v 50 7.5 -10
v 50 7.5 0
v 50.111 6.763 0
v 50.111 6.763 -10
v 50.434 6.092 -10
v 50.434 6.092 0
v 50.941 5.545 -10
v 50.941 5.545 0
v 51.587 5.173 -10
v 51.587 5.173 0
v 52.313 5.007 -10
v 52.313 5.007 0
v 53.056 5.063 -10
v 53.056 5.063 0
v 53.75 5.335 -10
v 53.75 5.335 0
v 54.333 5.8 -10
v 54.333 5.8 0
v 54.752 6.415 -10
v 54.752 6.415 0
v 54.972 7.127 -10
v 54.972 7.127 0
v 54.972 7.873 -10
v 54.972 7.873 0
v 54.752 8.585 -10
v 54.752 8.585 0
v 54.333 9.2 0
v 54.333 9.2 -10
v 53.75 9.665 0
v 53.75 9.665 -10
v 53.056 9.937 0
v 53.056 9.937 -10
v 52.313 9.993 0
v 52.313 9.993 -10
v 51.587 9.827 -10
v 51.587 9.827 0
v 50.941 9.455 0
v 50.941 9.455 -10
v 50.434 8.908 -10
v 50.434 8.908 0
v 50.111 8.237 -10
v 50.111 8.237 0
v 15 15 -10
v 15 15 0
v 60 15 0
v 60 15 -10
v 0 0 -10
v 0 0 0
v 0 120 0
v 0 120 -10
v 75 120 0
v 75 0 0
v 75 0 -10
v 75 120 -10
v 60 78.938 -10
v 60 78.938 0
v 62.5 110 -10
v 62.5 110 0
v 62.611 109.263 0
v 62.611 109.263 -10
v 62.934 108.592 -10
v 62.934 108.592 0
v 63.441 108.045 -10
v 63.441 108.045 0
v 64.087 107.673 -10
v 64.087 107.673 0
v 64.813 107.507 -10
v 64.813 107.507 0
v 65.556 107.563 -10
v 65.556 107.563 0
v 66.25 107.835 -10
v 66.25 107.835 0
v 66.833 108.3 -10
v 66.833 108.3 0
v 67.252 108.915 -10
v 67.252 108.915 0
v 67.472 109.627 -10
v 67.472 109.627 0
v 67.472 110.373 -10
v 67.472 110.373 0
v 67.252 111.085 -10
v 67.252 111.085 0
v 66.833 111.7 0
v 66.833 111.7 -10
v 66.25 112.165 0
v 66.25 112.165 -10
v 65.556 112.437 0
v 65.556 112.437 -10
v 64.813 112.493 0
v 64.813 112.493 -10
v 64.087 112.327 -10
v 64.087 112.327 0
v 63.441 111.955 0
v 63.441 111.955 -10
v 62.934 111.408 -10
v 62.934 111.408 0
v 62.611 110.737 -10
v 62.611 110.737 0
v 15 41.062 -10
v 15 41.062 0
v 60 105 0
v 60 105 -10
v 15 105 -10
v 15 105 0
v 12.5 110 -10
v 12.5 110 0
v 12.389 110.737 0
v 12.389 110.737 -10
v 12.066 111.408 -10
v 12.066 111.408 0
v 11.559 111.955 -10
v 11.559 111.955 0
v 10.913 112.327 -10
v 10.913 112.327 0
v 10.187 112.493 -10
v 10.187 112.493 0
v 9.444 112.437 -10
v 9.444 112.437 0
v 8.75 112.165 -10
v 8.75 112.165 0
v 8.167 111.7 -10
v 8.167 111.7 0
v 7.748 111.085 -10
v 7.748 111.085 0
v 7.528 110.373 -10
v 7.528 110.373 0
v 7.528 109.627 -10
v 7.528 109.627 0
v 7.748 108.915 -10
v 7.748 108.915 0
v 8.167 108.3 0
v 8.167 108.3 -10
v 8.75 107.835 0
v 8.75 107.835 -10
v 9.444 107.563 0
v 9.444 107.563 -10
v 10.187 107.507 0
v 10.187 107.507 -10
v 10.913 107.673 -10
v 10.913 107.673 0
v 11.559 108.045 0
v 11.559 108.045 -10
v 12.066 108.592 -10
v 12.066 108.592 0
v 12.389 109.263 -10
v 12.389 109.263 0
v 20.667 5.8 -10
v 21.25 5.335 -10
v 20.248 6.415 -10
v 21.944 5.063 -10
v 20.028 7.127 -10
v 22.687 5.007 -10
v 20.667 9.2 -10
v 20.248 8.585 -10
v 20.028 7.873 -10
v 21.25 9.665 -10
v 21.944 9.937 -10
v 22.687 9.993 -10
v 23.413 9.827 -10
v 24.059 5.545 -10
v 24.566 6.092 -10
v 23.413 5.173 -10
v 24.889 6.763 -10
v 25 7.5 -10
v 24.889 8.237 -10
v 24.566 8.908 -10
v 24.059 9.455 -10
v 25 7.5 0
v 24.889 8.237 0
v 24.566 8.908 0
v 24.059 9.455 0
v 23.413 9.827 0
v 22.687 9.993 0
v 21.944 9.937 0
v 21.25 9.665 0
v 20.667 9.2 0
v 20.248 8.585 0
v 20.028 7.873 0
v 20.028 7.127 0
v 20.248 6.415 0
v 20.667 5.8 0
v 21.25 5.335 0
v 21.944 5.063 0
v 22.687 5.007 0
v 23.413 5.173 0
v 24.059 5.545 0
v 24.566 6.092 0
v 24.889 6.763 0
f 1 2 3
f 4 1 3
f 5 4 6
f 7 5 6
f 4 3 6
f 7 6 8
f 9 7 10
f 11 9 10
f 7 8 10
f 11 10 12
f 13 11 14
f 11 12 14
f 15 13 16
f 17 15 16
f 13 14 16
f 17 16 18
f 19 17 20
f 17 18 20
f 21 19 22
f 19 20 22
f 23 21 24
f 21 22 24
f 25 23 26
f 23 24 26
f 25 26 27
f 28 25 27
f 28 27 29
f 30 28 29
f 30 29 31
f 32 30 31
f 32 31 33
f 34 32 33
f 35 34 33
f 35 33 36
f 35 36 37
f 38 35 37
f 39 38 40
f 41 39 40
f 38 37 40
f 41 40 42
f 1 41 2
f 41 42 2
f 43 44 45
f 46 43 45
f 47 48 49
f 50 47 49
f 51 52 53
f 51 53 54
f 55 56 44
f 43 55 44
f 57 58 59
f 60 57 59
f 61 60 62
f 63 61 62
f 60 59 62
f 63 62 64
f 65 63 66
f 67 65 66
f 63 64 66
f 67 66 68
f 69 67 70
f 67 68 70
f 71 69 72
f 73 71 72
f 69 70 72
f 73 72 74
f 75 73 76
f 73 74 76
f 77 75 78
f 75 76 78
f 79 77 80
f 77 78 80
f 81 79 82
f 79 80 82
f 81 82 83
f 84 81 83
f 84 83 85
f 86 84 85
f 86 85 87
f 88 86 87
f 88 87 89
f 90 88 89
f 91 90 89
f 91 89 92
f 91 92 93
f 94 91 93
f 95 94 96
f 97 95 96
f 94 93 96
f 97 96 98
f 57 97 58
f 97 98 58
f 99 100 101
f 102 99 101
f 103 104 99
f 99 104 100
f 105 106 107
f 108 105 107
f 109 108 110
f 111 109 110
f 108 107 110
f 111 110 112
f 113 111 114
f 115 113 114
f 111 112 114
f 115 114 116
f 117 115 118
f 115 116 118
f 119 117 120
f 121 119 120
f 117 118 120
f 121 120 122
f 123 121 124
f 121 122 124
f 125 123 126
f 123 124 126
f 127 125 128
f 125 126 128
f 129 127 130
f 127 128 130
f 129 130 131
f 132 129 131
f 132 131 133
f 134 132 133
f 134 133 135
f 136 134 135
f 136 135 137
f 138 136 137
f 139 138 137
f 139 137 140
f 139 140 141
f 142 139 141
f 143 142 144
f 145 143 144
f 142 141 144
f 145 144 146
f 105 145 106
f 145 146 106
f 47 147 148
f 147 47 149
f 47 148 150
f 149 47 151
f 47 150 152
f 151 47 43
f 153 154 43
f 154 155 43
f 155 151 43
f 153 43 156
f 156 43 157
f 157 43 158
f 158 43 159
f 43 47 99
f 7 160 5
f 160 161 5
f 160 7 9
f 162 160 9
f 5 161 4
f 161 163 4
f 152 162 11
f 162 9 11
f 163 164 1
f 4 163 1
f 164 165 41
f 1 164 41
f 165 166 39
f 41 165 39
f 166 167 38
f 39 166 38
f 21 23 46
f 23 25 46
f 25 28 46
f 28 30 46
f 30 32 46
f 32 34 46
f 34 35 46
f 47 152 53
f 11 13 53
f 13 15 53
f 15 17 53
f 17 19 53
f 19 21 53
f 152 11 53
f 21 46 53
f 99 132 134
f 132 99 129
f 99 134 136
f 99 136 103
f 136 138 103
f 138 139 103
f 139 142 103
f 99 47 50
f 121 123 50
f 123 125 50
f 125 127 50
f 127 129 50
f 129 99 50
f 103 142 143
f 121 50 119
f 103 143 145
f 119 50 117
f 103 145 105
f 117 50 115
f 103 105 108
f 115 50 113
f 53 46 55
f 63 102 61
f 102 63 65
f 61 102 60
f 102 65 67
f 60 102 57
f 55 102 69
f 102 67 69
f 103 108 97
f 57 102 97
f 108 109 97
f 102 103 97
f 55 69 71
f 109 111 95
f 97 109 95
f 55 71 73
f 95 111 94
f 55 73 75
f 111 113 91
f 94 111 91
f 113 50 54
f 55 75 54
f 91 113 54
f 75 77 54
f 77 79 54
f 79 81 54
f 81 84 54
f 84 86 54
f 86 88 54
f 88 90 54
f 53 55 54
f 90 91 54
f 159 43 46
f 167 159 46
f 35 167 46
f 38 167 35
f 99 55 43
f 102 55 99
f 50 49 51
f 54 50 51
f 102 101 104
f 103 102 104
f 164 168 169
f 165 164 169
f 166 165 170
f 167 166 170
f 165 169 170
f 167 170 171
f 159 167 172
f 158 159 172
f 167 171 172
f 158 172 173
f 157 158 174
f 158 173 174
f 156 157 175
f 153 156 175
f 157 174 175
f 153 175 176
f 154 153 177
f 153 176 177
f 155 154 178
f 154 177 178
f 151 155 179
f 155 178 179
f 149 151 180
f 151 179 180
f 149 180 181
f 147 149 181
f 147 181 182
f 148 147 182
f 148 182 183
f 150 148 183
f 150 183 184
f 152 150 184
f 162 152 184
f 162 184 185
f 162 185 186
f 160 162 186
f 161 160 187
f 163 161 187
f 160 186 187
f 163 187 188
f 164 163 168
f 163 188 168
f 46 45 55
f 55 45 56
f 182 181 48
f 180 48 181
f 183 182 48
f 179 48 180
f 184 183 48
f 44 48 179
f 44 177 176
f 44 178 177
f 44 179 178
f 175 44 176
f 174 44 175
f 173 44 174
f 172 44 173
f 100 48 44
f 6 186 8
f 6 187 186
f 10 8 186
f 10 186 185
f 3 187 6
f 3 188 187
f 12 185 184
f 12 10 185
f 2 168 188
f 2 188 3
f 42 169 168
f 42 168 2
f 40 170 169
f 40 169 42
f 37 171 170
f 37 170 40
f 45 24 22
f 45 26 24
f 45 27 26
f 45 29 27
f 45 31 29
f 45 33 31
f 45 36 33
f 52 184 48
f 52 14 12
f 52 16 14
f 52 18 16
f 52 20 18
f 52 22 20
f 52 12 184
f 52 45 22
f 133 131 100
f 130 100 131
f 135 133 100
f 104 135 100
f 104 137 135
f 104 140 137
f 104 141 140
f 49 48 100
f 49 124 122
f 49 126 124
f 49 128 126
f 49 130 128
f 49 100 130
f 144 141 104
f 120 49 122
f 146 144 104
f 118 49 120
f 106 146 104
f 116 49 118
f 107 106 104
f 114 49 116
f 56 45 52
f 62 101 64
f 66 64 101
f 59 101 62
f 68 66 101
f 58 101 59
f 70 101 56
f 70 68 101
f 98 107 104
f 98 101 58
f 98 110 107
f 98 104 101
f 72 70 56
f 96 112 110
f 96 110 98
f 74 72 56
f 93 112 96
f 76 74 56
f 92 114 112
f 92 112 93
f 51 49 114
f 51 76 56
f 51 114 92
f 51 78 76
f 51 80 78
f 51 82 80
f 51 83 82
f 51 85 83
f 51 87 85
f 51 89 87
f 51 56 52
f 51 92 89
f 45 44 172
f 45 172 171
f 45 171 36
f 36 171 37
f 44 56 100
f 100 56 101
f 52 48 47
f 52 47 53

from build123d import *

# Parameters (mm, degrees)
SKETCH1_W          = 75
SKETCH1_H          = 120
BASE_FLANGE1_DEPTH = 10
SKETCH7_R          = 2.5
CUT_EXTRUDE1_DEPTH = 10


# Sheet-metal steps are written as plain solids
with BuildPart() as part:
    # Sketch1 → Base-Flange1 (new body)
    with BuildSketch(Plane.XY):
        with Locations((37.5, 60)):
            Rectangle(SKETCH1_W, SKETCH1_H)
    extrude(amount=-BASE_FLANGE1_DEPTH)

    # Sketch7 → Cut-Extrude1 (cut)
    with BuildSketch(Plane.XY):
        with Locations((10, 110)):
            Circle(SKETCH7_R)
        with Locations((22.5, 7.5)):
            Circle(SKETCH7_R)
        with Locations(Location((52.5, 7.5, 0), (0, 0, 180))):
            Circle(SKETCH7_R)
        with Locations(Location((65, 110, 0), (0, 0, 180))):
            Circle(SKETCH7_R)
        Polygon((15, 105), (15, 41.062028891), (60, 105), align=None)
        Polygon((15, 15), (60, 15), (60, 78.937971109), align=None)
    extrude(amount=-CUT_EXTRUDE1_DEPTH, mode=Mode.SUBTRACT)


solid = part.part
